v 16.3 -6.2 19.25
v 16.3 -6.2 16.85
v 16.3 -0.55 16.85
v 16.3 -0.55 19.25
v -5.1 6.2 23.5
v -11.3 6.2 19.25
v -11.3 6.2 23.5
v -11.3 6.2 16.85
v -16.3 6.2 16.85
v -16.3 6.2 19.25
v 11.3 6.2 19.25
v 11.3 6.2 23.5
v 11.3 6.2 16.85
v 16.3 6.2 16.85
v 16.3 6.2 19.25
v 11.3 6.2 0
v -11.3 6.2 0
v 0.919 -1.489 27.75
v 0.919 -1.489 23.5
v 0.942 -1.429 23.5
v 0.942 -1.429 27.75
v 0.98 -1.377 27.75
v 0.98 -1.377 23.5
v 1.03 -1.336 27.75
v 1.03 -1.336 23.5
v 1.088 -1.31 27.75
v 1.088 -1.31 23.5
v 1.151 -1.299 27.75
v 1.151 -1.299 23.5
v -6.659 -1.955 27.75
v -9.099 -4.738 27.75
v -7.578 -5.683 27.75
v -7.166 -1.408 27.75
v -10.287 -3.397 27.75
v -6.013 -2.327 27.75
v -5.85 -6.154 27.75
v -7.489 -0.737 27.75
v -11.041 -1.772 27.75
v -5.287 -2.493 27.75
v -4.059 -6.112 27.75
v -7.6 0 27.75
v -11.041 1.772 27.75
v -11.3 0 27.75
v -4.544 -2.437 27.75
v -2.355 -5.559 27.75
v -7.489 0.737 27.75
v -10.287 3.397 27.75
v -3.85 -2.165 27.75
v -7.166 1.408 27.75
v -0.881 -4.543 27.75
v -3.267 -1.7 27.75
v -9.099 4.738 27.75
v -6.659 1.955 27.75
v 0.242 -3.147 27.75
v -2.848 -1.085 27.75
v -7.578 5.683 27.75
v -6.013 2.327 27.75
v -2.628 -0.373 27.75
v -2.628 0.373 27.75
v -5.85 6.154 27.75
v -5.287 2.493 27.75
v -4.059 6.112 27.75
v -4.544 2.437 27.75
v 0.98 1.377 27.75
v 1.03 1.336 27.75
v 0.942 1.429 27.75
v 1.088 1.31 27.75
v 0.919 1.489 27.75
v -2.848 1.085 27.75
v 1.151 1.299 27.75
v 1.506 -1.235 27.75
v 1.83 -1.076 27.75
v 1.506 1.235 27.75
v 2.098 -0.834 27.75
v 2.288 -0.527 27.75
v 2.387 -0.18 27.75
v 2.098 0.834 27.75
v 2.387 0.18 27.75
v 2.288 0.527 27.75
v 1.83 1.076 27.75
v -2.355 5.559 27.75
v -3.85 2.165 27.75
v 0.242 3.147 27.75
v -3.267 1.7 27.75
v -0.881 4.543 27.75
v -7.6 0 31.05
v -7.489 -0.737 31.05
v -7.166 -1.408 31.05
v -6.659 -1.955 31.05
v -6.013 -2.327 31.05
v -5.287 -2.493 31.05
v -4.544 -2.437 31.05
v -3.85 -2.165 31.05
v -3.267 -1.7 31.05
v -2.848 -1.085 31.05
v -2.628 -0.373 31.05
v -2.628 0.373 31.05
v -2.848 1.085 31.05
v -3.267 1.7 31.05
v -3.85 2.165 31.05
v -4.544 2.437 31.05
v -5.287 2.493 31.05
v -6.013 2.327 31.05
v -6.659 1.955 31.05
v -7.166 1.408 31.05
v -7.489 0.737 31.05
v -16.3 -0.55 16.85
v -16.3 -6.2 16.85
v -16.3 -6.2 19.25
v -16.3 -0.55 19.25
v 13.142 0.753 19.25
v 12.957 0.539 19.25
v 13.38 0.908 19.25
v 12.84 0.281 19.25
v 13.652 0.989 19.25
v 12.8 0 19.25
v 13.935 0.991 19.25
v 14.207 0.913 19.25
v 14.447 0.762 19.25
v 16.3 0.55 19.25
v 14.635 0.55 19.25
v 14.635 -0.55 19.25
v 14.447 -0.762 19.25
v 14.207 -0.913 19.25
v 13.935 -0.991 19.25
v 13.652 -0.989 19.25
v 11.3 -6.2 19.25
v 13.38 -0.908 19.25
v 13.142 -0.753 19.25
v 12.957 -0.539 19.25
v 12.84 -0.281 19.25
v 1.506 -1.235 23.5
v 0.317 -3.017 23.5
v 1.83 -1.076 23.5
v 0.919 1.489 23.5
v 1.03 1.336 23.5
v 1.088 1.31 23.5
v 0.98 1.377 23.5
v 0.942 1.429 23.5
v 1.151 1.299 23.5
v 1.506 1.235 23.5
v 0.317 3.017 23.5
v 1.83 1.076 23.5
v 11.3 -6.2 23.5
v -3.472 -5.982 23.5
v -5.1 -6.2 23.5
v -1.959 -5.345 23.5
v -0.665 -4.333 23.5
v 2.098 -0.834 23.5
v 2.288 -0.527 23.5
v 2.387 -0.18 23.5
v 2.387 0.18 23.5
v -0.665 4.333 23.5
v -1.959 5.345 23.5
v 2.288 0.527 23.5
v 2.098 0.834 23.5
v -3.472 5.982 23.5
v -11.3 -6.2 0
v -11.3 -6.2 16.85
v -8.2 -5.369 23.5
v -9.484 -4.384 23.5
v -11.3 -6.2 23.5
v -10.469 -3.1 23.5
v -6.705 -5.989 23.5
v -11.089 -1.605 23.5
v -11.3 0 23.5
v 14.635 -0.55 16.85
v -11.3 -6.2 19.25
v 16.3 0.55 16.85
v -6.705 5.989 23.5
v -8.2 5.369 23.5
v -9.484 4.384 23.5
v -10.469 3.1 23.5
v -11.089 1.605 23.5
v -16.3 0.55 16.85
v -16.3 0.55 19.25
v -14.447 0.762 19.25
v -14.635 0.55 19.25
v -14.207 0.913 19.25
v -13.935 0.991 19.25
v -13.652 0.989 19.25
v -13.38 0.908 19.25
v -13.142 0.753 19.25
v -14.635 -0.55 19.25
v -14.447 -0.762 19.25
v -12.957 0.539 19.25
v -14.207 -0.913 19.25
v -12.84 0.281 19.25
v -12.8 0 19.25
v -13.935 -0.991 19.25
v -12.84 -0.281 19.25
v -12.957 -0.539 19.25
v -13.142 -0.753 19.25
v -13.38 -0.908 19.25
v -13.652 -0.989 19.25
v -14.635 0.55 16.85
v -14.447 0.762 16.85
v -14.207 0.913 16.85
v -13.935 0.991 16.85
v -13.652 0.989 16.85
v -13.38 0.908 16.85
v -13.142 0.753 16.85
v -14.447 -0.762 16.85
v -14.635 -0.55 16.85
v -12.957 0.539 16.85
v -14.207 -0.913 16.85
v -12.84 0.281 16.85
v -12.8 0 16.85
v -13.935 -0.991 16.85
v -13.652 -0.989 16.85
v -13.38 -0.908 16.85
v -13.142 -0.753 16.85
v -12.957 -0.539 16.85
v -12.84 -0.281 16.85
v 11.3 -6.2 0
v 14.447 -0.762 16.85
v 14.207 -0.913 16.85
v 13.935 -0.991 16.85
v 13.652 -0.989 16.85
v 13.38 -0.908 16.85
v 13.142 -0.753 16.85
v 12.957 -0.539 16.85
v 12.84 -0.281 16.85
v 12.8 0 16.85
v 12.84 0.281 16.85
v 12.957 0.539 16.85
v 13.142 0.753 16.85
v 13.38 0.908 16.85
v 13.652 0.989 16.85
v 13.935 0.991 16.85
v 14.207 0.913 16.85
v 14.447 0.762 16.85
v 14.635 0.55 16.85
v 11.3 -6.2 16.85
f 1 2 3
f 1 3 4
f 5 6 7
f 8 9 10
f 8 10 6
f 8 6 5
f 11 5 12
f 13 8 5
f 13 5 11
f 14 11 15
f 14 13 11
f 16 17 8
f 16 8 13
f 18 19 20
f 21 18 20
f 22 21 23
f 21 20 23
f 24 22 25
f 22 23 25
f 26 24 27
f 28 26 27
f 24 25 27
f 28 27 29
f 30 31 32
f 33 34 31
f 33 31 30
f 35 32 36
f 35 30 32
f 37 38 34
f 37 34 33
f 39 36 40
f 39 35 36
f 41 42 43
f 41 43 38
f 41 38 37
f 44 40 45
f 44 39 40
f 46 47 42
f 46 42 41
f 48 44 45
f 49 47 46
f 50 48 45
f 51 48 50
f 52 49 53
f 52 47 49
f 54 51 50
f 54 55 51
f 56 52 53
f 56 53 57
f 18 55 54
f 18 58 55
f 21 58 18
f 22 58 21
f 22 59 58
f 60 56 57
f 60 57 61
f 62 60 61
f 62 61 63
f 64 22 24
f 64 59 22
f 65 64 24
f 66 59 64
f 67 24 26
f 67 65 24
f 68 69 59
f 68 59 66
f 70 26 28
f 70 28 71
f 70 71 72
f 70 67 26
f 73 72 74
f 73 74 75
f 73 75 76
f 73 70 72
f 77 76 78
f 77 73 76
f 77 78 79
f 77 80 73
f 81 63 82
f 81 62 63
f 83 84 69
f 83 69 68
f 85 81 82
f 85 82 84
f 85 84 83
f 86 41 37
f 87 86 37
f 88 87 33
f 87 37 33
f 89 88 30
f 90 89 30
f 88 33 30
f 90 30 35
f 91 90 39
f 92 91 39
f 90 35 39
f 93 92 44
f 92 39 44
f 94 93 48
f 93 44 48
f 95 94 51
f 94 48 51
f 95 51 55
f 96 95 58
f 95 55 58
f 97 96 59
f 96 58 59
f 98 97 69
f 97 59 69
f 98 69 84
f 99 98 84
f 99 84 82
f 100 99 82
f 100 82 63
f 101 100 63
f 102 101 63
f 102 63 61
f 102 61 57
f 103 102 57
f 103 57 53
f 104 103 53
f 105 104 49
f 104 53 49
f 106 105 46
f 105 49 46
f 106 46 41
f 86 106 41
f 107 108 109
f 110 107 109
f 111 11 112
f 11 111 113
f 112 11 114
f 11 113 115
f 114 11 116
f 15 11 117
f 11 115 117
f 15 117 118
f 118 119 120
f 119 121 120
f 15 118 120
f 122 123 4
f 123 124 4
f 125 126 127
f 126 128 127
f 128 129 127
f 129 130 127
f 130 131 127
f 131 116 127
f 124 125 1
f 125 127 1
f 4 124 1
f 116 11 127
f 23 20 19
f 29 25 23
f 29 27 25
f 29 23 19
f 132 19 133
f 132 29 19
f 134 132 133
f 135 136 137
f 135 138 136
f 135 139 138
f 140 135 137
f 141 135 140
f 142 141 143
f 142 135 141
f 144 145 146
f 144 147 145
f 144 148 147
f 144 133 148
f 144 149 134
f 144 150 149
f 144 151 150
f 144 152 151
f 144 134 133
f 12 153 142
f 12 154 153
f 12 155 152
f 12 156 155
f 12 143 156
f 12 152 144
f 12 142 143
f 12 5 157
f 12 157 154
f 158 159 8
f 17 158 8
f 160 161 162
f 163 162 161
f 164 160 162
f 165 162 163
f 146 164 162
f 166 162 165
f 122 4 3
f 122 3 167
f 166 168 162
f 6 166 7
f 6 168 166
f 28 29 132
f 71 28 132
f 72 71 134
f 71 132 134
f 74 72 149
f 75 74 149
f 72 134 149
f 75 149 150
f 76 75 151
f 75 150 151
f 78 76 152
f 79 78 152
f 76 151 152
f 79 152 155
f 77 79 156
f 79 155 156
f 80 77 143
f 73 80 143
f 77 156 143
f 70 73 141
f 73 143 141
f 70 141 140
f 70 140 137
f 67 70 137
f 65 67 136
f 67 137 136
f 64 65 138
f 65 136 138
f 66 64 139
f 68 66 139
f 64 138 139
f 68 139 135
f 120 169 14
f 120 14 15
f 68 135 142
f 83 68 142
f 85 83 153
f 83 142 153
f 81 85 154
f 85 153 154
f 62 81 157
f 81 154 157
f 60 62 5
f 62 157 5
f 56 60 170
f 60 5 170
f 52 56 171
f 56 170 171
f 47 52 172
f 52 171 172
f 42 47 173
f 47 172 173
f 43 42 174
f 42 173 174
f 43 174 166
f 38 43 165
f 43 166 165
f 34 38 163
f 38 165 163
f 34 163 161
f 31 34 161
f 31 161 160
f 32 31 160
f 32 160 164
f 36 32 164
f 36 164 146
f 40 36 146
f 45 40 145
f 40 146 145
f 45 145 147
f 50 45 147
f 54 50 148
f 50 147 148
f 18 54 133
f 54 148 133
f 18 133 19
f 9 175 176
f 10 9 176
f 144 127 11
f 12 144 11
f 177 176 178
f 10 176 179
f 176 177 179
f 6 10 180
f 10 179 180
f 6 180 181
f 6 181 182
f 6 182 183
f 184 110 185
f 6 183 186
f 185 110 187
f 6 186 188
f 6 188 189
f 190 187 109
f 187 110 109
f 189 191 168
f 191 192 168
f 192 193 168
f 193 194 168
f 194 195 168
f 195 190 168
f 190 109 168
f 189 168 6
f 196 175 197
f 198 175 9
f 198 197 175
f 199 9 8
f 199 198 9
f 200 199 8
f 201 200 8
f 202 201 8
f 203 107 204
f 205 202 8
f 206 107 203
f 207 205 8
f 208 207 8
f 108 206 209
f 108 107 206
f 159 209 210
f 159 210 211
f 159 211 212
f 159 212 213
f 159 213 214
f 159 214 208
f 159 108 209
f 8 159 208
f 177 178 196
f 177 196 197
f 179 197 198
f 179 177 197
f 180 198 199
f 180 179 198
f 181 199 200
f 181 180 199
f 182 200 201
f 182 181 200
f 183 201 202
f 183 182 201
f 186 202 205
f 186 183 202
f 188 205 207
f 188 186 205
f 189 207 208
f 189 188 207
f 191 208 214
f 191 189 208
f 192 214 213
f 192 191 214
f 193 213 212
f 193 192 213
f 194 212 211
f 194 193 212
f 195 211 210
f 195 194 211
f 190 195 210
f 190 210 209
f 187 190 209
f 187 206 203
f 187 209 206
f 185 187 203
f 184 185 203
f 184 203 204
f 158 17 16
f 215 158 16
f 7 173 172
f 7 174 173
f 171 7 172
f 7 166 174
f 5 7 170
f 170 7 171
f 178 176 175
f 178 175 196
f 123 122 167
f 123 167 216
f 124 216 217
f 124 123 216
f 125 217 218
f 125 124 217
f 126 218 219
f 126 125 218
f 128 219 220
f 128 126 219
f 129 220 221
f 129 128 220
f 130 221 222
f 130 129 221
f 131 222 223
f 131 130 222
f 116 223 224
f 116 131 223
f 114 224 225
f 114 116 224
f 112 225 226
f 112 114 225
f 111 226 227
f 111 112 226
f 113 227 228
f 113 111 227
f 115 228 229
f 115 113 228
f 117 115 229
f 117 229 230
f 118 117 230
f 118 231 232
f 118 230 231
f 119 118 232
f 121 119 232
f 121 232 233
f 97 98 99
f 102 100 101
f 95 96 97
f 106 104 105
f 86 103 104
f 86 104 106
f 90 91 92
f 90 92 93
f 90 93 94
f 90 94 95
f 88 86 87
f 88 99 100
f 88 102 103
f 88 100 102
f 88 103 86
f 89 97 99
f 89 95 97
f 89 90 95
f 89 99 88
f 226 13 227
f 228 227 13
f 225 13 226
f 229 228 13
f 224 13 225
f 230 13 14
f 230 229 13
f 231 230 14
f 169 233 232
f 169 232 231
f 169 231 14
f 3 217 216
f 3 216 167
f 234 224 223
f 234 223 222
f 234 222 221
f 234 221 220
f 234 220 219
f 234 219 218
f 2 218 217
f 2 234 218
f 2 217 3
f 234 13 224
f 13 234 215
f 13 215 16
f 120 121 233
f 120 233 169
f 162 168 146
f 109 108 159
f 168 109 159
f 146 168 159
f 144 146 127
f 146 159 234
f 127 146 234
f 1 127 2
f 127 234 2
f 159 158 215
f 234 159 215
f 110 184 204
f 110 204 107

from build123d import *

# Parameters (mm, degrees)
SKETCH1_W           = 22.6
SKETCH1_H           = 12.4
BOSS_EXTRUDE1_DEPTH = 23.5
SKETCH3_W           = 5
SKETCH3_H           = 2.4
BOSS_EXTRUDE2_DEPTH = 12.4
CUT_EXTRUDE1_DEPTH  = 26.974843599
BOSS_EXTRUDE3_DEPTH = 4.25
SKETCH6_R           = 2.5
BOSS_EXTRUDE4_DEPTH = 3.3


with BuildPart() as part:
    # Sketch1 → Boss-Extrude1 (new body)
    with BuildSketch(Plane.XY):
        Rectangle(SKETCH1_W, SKETCH1_H)
    extrude(amount=BOSS_EXTRUDE1_DEPTH)

    # Sketch3 → Boss-Extrude2 (add)
    with BuildSketch(Plane.XZ.offset(6.2)):
        with Locations((13.8, 18.05)):
            Rectangle(SKETCH3_W, SKETCH3_H)
        with Locations((-13.8, 18.05)):
            Rectangle(SKETCH3_W, SKETCH3_H)
    extrude(amount=-BOSS_EXTRUDE2_DEPTH)

    # Sketch4 → Cut-Extrude1 (cut, through all)
    with BuildSketch(Plane.XY.offset(19.25)):
        with BuildLine():
            Line((16.3, 0.55), (16.3, -0.55))
            Line((16.3, -0.55), (14.635164654, -0.55))
            ThreePointArc((14.635164654, -0.55), (12.8, 0), (14.635164654, 0.55))
            Line((14.635164654, 0.55), (16.3, 0.55))
        make_face()
        with BuildLine():
            Line((-16.3, 0.55), (-14.635164654, 0.55))
            ThreePointArc((-14.635164654, 0.55), (-12.8, 0), (-14.635164654, -0.55))
            Line((-14.635164654, -0.55), (-16.3, -0.55))
            Line((-16.3, -0.55), (-16.3, 0.55))
        make_face()
    extrude(amount=-CUT_EXTRUDE1_DEPTH, mode=Mode.SUBTRACT)

    # Sketch5 → Boss-Extrude3 (add)
    with BuildSketch(Plane.XY.offset(23.5)):
        with BuildLine():
            ThreePointArc((0.918604651, 1.488757218), (-11.3, 0), (0.918604651, -1.488757218))
            ThreePointArc((0.918604651, -1.488757218), (1.003329596, -1.355013632), (1.151404787, -1.298983275))
            ThreePointArc((1.151404787, -1.298983275), (2.4, 0), (1.151404787, 1.298983275))
            ThreePointArc((1.151404787, 1.298983275), (1.003329596, 1.355013632), (0.918604651, 1.488757218))
        make_face()
    extrude(amount=BOSS_EXTRUDE3_DEPTH)

    # Sketch6 → Boss-Extrude4 (add)
    with BuildSketch(Plane.XY.offset(27.75)):
        with Locations(Location((-5.1, 0, 0), (0, 0, 180))):
            Circle(SKETCH6_R)
    extrude(amount=BOSS_EXTRUDE4_DEPTH)


solid = part.part
